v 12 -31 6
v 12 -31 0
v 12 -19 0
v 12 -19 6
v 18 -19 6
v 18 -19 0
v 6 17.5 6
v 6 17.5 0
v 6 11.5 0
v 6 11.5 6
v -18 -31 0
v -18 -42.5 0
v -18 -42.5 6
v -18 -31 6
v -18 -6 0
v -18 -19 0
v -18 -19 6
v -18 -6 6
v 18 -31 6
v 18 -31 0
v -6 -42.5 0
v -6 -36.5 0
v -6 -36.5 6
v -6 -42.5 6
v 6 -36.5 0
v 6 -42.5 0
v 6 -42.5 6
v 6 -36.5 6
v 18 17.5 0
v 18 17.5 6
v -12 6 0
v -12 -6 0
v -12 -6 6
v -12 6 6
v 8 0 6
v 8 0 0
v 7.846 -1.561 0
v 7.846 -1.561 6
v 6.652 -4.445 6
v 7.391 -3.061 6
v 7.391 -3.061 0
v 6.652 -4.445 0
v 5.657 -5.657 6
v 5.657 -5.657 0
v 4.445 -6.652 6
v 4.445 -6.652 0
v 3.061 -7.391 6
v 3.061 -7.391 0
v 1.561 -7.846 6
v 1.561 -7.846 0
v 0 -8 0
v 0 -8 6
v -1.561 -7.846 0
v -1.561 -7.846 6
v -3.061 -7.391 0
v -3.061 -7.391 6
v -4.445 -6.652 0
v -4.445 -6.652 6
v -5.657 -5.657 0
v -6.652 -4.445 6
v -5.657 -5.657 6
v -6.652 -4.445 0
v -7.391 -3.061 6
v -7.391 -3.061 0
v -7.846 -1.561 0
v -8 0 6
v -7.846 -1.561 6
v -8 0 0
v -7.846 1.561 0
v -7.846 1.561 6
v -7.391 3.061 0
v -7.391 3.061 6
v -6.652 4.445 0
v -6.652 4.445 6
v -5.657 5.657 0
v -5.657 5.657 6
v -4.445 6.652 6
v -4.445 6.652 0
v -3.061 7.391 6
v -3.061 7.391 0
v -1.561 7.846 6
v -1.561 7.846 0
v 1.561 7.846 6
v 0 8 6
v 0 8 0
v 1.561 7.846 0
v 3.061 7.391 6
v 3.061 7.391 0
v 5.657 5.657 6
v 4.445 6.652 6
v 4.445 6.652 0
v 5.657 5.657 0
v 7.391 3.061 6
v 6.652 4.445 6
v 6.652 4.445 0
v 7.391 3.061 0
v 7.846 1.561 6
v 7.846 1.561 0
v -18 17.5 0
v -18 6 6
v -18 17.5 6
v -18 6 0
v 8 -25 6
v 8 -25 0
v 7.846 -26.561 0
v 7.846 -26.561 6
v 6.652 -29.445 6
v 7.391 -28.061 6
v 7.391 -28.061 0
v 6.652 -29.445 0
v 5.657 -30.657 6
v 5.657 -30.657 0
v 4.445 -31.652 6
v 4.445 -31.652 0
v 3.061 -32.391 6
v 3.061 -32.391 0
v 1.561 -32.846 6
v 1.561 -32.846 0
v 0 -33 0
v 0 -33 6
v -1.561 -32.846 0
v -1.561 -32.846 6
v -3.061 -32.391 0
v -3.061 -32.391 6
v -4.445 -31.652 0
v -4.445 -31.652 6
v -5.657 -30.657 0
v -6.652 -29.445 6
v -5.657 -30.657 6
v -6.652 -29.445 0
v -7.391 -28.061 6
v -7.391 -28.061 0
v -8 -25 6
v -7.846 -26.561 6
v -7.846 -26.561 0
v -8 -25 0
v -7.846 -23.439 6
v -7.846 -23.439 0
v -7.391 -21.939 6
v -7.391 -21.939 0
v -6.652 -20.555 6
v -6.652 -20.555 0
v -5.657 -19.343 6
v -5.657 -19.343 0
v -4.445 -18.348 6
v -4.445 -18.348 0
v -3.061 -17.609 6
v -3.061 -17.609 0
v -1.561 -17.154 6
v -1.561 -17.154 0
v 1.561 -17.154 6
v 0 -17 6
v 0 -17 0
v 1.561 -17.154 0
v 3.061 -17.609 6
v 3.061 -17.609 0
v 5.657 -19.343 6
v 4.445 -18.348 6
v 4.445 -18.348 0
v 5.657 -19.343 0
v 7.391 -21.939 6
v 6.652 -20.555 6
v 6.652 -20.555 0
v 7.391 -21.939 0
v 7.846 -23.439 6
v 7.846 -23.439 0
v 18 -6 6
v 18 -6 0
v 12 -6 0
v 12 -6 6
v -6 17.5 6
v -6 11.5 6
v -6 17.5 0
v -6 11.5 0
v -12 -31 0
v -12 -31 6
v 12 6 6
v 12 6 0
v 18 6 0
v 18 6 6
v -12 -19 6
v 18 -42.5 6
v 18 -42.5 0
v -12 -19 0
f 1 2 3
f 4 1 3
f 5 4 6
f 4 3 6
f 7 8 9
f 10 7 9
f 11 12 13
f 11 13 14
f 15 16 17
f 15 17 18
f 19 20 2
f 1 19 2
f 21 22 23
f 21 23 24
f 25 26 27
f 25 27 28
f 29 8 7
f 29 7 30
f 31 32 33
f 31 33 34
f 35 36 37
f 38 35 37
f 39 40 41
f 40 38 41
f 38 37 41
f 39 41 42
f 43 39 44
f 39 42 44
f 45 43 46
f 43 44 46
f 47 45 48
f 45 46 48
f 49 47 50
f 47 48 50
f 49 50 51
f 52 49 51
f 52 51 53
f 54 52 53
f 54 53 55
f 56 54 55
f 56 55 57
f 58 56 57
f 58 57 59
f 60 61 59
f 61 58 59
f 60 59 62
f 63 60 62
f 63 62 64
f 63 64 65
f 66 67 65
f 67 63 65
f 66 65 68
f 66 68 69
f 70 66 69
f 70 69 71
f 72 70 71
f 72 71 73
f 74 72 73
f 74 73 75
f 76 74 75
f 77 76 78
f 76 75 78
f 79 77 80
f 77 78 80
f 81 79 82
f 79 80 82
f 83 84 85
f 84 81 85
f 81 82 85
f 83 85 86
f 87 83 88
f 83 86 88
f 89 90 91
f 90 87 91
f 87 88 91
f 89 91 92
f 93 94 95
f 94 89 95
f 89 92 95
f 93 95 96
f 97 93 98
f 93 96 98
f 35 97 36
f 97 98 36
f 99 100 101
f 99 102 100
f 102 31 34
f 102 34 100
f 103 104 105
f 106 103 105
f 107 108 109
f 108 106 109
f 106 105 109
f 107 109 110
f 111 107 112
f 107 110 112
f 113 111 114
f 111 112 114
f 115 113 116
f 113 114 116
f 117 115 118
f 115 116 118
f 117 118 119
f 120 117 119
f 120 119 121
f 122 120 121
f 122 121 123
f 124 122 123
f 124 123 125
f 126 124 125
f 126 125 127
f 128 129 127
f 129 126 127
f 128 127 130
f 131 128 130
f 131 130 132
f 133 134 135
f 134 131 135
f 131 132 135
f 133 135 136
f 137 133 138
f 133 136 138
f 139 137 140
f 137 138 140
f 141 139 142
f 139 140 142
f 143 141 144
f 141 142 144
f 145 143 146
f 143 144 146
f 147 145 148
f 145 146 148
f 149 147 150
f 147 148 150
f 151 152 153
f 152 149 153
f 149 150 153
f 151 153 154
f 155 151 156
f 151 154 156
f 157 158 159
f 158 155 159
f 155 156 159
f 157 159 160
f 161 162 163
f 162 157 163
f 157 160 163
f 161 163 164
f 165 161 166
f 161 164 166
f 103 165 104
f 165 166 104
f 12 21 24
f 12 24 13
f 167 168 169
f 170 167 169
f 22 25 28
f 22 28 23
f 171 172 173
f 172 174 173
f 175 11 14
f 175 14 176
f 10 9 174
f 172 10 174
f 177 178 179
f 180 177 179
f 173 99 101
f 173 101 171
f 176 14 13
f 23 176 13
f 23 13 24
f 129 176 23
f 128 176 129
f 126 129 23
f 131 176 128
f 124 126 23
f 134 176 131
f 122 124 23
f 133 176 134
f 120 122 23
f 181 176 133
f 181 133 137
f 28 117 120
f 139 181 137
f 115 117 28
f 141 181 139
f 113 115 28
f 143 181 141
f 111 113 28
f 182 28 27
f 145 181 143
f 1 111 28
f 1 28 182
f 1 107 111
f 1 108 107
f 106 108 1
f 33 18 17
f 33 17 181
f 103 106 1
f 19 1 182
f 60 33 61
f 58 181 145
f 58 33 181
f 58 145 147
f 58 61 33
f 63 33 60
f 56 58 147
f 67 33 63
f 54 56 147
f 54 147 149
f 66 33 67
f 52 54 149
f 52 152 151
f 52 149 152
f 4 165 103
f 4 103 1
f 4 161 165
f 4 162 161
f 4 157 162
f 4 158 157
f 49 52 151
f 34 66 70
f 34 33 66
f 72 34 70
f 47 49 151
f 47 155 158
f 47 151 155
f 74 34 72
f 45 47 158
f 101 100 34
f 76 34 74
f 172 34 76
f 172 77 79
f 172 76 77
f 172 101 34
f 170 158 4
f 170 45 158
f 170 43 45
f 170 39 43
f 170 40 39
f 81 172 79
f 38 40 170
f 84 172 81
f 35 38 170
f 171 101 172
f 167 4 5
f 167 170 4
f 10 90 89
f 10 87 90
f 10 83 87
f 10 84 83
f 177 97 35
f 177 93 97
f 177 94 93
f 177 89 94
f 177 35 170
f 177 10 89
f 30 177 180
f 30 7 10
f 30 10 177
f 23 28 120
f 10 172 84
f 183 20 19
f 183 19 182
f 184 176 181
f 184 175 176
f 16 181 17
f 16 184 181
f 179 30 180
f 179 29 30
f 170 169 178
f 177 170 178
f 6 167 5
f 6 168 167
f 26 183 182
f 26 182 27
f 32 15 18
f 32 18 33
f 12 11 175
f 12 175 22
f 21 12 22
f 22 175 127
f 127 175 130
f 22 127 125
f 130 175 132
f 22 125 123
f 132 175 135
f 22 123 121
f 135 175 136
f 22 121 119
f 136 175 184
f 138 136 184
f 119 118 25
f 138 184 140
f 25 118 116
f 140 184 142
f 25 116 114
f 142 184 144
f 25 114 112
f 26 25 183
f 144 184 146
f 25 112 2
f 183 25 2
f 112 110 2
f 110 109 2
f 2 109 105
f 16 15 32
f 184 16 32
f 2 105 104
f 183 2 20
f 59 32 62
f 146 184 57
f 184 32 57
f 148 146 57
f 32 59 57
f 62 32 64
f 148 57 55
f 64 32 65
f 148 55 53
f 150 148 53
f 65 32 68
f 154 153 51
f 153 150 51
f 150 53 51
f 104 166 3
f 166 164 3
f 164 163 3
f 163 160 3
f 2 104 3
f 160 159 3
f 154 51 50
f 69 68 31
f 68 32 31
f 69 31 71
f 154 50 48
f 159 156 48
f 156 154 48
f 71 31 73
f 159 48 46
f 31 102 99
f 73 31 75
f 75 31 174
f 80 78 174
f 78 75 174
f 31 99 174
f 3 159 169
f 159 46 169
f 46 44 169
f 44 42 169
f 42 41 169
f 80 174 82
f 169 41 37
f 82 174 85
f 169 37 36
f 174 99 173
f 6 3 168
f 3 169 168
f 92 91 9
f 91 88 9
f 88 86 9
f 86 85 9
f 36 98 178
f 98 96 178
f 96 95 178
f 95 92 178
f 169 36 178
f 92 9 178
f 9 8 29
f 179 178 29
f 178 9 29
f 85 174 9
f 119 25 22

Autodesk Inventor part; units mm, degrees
ref_plane "YZ Plane" through (0, 0, 0) normal (1, 0, 0) x (0, 1, 0)
ref_plane "XZ Plane" through (0, 0, 0) normal (0, 1, 0) x (-1, 0, 0)
ref_plane "XY Plane" through (0, 0, 0) normal (0, 0, 1) x (1, 0, 0)
sketch "Sketch1" plane through (0, 0, 0) normal (0, 0, 1) x (1, 0, 0)
  circle A0 centre (0, 0) radius 8
  circle A1 centre (0, -25) radius 8
  line L0 (0, 0) -> (0, -25) construction
  line L1 (-18, 17.5) -> (18, 17.5)
  line L2 (18, 17.5) -> (18, -42.5)
  line L3 (18, -42.5) -> (-18, -42.5)
  line L4 (-18, -42.5) -> (-18, 17.5)
  line L5 (-18, 17.5) -> (18, -42.5) construction
  line L6 (18, 17.5) -> (-18, -42.5) construction
  line L7 (-6, 17.5) -> (6, 17.5)
  line L8 (6, 17.5) -> (6, 11.5)
  line L9 (6, 11.5) -> (-6, 11.5)
  line L10 (-6, 11.5) -> (-6, 17.5)
  line L11 (-6, -42.5) -> (6, -42.5)
  line L12 (6, -42.5) -> (6, -36.5)
  line L13 (6, -36.5) -> (-6, -36.5)
  line L14 (-6, -36.5) -> (-6, -42.5)
  line L15 (-18, -31) -> (-12, -31)
  line L16 (-12, -31) -> (-12, -19)
  line L17 (-12, -19) -> (-18, -19)
  line L18 (-18, -19) -> (-18, -31)
  line L19 (-18, -6) -> (-12, -6)
  line L20 (-12, -6) -> (-12, 6)
  line L21 (-12, 6) -> (-18, 6)
  line L22 (-18, 6) -> (-18, -6)
  line L23 (18, -6) -> (12, -6)
  line L24 (12, -6) -> (12, 6)
  line L25 (12, 6) -> (18, 6)
  line L26 (18, 6) -> (18, -6)
  line L27 (18, -31) -> (12, -31)
  line L28 (12, -31) -> (12, -19)
  line L29 (12, -19) -> (18, -19)
  line L30 (18, -19) -> (18, -31)
  point P0 (0, -12.5)
  point P1 (0, 11.5)
  point P2 (0, 17.5)
  point P3 (12, 0)
  point P4 (-12, 0)
  point P5 (-12, -25)
  point P6 (12, -25)
  dimension "d0" = 16
  dimension "d1" = 25
  dimension "d2" = 36
  dimension "d3" = 60
  dimension "d4" = 12
  dimension "d5" = 6
extrude "Plate1" add sketch "Sketch1" along normal blind 6 contours L1 L10 L9 L8 L2 L25 L24 L23 L29 L28 L27 L3 L12 L13 L14 L4 L15 L16 L17 L19 L20 L21
equation "\"d7\" = Thickness"
equation "\"BendRadius\" = Thickness"
equation "\"BendReliefWidth\" = Thickness"
equation "\"BendReliefDepth\" = 0.5 * Thickness"
equation "\"CornerReliefSize\" = 4 * Thickness"
equation "\"MinimumRemnant\" = 2 * Thickness"
equation "\"TransitionRadius\" = BendRadius"
equation "\"JacobiRadiusSize\" = BendRadius"
equation "\"GapSize\" = Thickness"
equation "\"Thickness\" = 6"
properties part number "voorkant knoppendoosje" material "Wood (Birch)"
